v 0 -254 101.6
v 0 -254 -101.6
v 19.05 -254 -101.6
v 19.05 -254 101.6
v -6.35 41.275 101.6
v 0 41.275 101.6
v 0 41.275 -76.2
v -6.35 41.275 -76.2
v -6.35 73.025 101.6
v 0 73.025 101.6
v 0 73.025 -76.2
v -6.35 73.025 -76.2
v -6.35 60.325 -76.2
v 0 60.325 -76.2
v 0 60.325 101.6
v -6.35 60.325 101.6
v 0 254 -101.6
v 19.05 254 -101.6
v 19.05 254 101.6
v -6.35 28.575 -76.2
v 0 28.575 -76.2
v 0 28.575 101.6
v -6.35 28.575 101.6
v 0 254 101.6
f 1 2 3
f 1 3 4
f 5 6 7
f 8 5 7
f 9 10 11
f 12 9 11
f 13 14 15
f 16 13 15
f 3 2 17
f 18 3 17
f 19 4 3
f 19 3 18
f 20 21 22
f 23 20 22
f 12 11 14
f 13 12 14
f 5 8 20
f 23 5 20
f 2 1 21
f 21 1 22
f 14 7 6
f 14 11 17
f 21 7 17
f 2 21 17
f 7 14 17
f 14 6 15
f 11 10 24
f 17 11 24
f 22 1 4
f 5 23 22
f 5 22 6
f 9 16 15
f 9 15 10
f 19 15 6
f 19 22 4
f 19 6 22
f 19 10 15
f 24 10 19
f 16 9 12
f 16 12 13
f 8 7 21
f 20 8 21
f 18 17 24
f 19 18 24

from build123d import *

# Parameters (mm, degrees)
F0_W     = 508
F0_H     = 203.2
F1_DEPTH = 19.05
F2_W     = 12.7
F2_H     = 101.6
F2_H_2   = 76.2
F3_DEPTH = 6.35


with BuildPart() as f1:
    # F0 (on Right) → F1 (new body)
    with BuildSketch(Plane.YZ):
        Rectangle(F0_W, F0_H)
    extrude(amount=F1_DEPTH)

    # F2 (on face) → F3 (join)
    with BuildSketch(Plane(origin=(0, 0, 0), x_dir=(0, -1, 0), z_dir=(-1, 0, 0))):
        with Locations((-66.675, 50.8)):
            Rectangle(F2_W, F2_H)
        with Locations((-66.675, -38.1)):
            Rectangle(F2_W, F2_H_2)
        with Locations((-34.925, -38.1)):
            Rectangle(F2_W, F2_H_2)
        with Locations((-34.925, 50.8)):
            Rectangle(F2_W, F2_H)
    extrude(amount=F3_DEPTH)


solid = f1.part
